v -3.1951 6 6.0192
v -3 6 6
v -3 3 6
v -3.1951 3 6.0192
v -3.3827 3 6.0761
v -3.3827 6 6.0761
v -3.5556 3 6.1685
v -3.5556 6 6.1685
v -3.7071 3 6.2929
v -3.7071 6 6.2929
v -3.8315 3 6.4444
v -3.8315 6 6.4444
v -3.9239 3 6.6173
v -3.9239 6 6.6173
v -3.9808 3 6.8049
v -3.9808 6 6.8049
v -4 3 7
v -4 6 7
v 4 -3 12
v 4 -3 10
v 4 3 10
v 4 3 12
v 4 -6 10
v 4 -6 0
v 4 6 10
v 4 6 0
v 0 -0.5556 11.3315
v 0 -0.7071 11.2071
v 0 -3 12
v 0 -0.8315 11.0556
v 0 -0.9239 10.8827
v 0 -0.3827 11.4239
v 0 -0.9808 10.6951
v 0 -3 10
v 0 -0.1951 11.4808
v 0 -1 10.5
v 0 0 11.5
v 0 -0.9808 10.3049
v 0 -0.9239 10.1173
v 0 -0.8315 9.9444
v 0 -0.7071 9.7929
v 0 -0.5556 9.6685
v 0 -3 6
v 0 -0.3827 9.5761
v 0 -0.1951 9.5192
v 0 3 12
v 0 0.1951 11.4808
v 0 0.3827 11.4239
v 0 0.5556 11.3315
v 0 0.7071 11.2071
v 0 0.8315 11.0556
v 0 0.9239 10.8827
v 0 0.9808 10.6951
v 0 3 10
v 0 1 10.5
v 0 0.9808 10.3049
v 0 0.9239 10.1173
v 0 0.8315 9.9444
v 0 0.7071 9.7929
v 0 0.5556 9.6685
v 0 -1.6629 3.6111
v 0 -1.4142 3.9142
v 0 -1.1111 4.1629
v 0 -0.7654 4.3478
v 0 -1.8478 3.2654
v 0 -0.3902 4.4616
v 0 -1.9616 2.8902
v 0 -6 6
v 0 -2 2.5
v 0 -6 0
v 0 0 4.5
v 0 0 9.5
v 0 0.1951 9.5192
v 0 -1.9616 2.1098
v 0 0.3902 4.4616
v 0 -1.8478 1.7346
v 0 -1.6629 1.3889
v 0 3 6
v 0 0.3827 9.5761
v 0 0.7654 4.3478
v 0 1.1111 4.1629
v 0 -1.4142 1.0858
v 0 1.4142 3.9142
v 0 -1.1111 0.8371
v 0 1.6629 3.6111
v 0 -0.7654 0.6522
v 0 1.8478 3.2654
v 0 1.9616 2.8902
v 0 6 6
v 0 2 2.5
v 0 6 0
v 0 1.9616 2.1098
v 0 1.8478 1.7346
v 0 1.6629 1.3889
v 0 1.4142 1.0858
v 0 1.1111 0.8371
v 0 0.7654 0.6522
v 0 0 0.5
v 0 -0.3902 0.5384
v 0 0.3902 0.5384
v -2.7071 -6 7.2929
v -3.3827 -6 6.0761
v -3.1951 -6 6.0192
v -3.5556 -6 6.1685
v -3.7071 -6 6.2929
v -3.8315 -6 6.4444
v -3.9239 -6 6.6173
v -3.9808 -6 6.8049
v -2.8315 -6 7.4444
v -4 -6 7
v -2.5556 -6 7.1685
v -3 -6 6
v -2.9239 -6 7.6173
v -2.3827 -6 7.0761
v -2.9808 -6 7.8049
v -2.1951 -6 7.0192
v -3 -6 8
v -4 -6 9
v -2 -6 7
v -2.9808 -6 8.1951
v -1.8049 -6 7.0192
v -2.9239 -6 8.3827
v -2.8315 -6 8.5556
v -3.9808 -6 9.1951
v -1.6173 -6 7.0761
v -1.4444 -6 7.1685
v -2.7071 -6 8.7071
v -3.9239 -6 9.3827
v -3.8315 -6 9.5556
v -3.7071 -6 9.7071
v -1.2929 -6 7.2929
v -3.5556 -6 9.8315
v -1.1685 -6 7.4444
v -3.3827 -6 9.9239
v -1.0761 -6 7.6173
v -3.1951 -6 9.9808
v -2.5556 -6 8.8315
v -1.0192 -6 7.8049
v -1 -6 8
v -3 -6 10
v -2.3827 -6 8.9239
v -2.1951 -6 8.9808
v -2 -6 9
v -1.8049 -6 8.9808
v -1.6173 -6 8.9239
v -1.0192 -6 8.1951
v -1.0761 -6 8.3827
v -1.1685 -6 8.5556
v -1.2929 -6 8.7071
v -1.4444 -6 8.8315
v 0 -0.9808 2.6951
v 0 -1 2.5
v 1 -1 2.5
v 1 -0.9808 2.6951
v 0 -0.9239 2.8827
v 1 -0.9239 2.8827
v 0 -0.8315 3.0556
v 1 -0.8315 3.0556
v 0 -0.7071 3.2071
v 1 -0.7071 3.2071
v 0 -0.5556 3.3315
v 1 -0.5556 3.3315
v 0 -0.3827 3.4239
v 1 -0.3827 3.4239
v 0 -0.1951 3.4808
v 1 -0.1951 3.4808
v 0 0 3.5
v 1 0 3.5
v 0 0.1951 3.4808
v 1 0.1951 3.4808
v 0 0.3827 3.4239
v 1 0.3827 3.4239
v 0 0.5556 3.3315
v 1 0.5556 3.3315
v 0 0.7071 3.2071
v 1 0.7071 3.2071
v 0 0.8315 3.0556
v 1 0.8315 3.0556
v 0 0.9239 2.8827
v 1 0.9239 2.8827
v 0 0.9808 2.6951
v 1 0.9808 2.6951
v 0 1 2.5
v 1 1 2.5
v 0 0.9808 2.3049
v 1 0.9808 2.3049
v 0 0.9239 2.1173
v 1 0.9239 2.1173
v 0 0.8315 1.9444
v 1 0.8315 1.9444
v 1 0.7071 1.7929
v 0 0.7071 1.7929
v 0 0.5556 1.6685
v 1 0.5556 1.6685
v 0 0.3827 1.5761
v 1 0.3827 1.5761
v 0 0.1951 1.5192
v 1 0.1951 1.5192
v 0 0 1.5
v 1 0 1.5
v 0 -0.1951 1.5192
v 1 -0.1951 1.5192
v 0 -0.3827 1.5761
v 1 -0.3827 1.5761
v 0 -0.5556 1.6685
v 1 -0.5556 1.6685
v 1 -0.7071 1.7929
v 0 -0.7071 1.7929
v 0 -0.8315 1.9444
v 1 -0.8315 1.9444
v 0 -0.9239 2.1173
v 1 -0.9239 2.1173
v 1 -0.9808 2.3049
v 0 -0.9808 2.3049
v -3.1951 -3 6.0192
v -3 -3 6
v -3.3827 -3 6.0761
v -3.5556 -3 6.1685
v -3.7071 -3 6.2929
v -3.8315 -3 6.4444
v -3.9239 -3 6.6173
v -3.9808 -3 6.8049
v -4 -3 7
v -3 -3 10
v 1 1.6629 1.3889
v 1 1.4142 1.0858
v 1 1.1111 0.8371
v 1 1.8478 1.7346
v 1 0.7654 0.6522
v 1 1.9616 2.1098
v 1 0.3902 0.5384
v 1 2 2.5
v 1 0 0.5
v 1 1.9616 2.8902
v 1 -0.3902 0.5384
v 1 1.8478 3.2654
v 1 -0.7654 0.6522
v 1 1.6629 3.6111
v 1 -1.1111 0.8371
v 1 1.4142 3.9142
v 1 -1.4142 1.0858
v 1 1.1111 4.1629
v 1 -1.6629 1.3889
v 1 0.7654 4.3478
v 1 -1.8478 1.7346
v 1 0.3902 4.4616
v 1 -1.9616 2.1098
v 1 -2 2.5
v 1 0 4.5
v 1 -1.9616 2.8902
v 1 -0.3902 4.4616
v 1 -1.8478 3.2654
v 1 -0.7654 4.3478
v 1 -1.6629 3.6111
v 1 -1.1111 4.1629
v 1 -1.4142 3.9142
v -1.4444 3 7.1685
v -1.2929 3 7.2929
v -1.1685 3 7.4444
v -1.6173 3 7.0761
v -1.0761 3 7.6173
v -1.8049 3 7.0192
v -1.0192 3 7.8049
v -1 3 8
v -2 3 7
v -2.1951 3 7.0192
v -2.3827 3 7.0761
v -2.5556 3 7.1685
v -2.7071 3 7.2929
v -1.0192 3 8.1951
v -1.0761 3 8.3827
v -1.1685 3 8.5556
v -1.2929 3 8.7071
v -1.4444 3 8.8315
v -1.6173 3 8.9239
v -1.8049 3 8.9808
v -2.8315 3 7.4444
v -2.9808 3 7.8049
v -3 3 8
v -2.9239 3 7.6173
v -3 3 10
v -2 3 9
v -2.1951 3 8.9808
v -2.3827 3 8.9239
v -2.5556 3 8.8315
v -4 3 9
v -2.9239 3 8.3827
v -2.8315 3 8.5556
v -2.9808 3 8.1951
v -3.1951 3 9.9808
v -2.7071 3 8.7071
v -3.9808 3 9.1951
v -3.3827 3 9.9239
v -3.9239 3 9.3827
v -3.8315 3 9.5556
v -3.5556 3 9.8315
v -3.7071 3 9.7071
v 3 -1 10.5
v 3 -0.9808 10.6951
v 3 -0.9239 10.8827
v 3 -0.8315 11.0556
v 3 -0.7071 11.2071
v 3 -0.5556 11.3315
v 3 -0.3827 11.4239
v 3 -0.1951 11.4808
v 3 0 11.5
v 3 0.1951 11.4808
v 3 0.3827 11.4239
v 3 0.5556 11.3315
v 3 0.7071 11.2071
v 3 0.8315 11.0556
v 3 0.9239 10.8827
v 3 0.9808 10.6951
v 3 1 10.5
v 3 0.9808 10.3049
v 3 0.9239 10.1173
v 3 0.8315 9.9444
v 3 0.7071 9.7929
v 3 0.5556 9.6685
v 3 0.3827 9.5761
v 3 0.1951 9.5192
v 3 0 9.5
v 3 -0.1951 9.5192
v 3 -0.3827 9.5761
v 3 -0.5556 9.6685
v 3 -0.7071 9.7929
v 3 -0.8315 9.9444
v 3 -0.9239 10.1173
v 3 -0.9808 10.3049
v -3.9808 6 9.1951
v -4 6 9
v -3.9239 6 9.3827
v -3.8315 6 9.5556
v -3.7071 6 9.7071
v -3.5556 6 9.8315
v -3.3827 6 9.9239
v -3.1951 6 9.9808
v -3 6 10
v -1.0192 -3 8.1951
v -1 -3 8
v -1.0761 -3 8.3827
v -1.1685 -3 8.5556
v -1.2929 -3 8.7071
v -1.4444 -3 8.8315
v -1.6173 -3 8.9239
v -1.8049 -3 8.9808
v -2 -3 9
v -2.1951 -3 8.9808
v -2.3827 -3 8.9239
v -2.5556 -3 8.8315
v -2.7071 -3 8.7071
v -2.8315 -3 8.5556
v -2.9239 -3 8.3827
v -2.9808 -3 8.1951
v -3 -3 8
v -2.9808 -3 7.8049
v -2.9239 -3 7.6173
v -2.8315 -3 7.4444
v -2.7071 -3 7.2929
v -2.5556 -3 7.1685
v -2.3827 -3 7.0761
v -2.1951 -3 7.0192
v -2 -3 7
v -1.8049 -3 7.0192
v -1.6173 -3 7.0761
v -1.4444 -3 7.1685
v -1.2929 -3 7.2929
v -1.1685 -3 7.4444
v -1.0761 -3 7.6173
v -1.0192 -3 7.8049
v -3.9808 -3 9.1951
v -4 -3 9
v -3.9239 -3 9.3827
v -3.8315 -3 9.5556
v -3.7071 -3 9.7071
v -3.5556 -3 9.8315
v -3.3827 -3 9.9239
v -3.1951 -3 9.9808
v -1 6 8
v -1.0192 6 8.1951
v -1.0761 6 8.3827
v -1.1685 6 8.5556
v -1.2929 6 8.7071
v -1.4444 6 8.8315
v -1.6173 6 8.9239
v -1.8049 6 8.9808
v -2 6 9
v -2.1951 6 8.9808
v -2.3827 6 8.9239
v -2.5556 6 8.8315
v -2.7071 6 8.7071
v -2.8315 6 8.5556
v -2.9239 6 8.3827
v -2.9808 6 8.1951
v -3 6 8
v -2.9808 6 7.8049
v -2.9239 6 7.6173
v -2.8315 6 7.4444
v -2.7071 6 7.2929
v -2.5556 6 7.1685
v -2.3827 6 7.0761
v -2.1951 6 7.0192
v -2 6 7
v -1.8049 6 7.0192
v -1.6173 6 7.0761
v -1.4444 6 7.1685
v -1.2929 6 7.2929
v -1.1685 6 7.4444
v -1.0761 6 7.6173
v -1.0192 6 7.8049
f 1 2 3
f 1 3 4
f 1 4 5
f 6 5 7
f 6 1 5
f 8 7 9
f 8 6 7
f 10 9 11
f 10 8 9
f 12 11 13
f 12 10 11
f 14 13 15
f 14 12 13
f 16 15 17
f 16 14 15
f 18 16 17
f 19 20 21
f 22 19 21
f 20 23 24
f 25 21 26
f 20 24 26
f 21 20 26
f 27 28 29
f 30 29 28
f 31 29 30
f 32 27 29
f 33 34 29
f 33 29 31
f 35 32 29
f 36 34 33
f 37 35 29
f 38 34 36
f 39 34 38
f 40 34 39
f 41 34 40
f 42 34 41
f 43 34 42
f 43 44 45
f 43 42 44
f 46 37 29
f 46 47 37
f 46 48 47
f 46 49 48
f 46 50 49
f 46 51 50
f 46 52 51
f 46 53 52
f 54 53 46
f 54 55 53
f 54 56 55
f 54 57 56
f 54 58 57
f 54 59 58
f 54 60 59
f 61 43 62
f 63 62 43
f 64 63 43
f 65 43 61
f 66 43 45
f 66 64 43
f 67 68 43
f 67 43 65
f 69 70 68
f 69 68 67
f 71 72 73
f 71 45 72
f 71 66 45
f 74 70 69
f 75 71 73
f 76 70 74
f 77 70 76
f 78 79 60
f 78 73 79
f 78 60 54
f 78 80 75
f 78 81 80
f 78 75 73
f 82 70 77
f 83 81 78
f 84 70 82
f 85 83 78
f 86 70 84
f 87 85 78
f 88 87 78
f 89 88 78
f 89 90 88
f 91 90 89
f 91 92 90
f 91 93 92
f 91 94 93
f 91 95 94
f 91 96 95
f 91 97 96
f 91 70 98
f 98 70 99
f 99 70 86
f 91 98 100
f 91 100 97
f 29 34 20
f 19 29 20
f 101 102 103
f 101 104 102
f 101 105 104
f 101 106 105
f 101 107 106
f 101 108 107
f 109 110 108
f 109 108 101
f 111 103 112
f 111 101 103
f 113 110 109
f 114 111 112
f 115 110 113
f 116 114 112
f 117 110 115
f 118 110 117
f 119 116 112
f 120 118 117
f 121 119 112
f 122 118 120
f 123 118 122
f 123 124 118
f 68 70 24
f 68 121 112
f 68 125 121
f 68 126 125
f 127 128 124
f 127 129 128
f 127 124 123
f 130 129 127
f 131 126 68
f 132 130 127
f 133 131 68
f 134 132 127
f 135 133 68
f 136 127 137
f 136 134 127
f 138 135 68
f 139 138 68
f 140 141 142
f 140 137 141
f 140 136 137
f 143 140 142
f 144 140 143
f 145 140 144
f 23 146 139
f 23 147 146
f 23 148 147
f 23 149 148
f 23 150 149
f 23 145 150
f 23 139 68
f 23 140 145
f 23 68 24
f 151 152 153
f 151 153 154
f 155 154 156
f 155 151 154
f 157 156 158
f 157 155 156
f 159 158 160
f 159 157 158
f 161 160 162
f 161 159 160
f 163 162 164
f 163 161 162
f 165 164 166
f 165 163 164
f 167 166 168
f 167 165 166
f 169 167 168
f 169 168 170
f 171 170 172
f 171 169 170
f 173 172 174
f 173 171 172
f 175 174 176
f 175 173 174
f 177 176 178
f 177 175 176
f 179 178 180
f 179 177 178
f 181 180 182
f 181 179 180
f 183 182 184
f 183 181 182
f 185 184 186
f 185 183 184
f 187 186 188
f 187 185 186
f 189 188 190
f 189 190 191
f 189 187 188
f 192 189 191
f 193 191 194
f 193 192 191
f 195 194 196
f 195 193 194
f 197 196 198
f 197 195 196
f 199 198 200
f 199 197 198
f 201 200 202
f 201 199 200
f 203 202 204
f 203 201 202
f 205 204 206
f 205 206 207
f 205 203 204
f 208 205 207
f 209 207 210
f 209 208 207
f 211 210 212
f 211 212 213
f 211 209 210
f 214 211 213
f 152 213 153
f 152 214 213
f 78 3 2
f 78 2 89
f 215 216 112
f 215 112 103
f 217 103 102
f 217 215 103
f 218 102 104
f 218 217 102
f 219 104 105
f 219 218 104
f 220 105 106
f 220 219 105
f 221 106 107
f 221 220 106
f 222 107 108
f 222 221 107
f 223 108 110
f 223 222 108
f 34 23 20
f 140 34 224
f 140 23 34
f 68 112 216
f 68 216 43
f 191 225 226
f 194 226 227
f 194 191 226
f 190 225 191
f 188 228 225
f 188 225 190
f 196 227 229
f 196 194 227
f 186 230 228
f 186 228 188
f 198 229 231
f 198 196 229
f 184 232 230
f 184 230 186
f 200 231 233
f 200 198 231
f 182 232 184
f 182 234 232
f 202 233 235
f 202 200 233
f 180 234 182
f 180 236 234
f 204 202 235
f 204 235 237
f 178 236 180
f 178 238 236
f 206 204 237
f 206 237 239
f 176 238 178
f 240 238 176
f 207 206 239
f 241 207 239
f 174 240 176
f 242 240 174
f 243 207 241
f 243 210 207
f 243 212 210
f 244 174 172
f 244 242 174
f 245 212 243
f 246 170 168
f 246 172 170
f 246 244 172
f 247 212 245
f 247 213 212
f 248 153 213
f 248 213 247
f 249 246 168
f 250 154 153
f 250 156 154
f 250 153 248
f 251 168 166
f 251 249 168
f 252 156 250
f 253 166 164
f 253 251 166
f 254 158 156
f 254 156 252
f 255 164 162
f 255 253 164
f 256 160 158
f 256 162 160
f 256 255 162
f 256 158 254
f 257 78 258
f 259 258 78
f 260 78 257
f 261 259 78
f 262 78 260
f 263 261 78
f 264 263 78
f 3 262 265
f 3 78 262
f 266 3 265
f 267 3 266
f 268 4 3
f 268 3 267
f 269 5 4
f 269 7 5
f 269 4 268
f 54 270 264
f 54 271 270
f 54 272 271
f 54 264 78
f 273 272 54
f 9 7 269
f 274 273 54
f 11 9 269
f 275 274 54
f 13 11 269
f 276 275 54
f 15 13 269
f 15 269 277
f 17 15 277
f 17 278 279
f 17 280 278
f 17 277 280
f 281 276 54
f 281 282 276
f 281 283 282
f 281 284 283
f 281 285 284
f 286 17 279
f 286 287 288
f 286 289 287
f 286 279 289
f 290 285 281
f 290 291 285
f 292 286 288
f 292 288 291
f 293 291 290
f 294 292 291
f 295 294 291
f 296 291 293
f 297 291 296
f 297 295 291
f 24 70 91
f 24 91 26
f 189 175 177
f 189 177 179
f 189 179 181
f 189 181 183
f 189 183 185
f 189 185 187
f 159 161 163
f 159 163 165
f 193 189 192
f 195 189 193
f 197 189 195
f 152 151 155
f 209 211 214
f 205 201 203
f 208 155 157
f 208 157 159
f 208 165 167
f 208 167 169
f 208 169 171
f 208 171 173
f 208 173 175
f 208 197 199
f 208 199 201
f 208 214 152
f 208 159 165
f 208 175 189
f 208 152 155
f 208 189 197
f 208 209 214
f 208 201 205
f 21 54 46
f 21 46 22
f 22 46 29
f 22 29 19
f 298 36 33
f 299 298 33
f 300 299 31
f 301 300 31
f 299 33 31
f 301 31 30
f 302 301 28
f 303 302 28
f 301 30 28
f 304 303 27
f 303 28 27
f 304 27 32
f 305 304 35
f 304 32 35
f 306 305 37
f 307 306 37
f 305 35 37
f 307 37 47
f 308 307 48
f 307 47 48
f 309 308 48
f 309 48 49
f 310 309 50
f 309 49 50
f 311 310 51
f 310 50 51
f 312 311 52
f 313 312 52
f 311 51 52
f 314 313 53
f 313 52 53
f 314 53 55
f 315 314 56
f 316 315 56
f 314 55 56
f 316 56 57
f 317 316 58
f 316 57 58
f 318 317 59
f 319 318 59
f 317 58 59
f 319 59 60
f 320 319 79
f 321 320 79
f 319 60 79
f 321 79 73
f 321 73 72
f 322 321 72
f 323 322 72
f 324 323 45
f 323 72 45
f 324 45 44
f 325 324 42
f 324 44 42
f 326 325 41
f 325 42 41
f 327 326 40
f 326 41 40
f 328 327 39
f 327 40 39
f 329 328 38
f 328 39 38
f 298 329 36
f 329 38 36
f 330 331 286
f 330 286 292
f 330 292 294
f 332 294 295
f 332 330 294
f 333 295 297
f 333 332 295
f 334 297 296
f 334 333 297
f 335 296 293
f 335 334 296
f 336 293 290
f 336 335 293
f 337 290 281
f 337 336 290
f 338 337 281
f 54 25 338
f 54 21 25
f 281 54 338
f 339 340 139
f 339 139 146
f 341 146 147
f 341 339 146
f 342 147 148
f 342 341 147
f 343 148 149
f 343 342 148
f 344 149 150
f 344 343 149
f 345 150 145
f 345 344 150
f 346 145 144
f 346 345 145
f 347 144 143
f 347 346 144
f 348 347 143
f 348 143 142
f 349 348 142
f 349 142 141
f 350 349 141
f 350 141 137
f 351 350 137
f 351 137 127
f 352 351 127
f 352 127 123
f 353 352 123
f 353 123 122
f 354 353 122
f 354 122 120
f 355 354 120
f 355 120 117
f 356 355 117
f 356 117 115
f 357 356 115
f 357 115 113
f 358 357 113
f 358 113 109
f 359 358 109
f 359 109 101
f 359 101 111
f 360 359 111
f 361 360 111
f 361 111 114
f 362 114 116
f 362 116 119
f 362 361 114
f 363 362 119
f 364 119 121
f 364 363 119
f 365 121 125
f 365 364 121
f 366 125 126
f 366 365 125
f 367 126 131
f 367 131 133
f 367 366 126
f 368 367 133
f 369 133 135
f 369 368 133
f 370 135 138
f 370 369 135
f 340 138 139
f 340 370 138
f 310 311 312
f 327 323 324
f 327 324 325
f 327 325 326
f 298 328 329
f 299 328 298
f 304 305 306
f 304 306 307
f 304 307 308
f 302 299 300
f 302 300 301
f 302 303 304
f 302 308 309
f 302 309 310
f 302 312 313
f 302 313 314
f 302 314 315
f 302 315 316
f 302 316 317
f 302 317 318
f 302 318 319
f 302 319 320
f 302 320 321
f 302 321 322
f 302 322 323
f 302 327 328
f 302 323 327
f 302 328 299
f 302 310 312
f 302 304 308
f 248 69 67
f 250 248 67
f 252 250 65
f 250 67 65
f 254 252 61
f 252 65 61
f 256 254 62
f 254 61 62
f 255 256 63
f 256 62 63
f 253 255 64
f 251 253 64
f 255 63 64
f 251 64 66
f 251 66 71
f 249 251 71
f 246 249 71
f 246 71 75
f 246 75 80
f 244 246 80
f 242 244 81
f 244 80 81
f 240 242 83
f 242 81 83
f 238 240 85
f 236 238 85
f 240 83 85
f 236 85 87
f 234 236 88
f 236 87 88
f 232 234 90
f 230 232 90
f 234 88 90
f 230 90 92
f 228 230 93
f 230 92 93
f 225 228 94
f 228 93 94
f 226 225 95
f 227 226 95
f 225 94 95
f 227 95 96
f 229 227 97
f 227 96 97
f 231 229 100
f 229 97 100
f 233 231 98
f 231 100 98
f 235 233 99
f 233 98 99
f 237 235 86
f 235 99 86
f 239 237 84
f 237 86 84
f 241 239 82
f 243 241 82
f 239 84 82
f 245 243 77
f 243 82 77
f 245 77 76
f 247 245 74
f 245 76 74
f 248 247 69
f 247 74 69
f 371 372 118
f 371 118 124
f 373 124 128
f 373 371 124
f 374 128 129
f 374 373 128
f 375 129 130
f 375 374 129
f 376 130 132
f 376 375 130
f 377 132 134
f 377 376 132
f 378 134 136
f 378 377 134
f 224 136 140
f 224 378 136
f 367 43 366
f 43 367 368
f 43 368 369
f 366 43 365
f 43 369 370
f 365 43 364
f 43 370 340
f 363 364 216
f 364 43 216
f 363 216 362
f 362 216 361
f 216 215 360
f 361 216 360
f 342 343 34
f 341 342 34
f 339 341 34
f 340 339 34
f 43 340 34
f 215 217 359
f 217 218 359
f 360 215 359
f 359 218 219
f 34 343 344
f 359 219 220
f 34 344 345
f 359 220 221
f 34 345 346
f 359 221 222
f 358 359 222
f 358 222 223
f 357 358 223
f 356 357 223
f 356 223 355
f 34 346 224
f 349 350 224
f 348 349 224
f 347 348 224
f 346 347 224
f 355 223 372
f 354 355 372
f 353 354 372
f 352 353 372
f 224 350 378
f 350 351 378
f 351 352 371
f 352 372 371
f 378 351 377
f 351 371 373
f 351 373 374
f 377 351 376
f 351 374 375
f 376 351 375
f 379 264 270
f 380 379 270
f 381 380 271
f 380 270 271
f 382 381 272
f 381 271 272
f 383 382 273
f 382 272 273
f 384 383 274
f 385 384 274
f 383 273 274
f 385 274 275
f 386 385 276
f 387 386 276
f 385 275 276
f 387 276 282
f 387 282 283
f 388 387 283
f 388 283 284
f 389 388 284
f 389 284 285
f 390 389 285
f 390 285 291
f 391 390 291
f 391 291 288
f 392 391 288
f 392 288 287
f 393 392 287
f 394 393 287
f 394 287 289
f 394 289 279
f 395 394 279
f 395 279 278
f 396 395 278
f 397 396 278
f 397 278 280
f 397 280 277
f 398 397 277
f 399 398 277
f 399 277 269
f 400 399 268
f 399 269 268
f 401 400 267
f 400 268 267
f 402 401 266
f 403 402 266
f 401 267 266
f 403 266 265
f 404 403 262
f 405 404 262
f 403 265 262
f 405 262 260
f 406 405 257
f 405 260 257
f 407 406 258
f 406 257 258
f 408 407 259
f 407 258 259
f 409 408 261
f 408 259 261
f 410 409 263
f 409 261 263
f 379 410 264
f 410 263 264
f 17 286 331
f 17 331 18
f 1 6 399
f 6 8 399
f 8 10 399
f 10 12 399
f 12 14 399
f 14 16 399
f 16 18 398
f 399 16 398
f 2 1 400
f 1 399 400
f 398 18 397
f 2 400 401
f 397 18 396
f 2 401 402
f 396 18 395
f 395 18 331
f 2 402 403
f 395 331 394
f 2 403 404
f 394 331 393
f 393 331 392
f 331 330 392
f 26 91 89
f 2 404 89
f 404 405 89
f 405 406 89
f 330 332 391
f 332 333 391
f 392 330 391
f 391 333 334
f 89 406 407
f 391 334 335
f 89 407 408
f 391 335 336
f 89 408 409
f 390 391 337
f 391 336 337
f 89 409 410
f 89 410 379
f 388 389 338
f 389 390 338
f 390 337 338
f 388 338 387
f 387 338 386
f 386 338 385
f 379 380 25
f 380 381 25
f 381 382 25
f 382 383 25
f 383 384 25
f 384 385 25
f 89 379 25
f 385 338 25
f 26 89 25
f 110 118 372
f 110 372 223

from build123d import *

# Parameters (mm, degrees)
F0_R          = 1
F1_DEPTH      = 6
F1_DEPTH_BACK = 6
F2_R          = 1
F3_W          = 6
F3_H          = 4
F4_DEPTH      = 4
F5_R          = 2
F5_R_2        = 1
F6_DEPTH      = 1
F7_W          = 4
F7_H          = 6
F8_DEPTH      = 2
F9_R          = 1
F10_DEPTH     = 3


with BuildPart() as f1:
    # F0 (on Front) → F1 (new body, two sides)
    with BuildSketch(Plane.XZ) as f1_sk:
        Polygon((0, 6), (0, 0), (4, 0), (4, 6), (4, 10), (0, 10), (-4, 10), (-4, 6), align=None)
        with Locations((-2, 8)):
            Circle(F0_R, mode=Mode.SUBTRACT)
    extrude(amount=F1_DEPTH)
    extrude(f1_sk.sketch, amount=-F1_DEPTH_BACK)

    # F2
    f2_edges = [f1.edges().sort_by_distance(p)[0] for p in [
        (-4, 0, 10),
        (-4, 0, 6),
    ]]
    fillet(f2_edges, radius=F2_R)

    # F3 (on face) → F4 (cut, through all)
    with BuildSketch(Plane(origin=(-4, 0, 0), x_dir=(0, -1, 0), z_dir=(-1, 0, 0))):
        with Locations((0, 8)):
            Rectangle(F3_W, F3_H)
    extrude(amount=-F4_DEPTH, mode=Mode.SUBTRACT)

    # F5 (on face) → F6 (cut)
    with BuildSketch(Plane(origin=(0, 0, 0), x_dir=(0, -1, 0), z_dir=(-1, 0, 0))):
        with Locations((0, 2.5)):
            Circle(F5_R)
        with Locations((0, 2.5)):
            Circle(F5_R_2, mode=Mode.SUBTRACT)
    extrude(amount=-F6_DEPTH, mode=Mode.SUBTRACT)

    # F7 (on face) → F8 (join)
    with BuildSketch(Plane.XY.offset(10)):
        with Locations((2, 0)):
            Rectangle(F7_W, F7_H)
    extrude(amount=F8_DEPTH)

    # F9 (on face) → F10 (cut)
    with BuildSketch(Plane(origin=(0, 0, 0), x_dir=(0, -1, 0), z_dir=(-1, 0, 0))):
        with Locations((0, 10.5)):
            Circle(F9_R)
    extrude(amount=-F10_DEPTH, mode=Mode.SUBTRACT)


solid = f1.part
